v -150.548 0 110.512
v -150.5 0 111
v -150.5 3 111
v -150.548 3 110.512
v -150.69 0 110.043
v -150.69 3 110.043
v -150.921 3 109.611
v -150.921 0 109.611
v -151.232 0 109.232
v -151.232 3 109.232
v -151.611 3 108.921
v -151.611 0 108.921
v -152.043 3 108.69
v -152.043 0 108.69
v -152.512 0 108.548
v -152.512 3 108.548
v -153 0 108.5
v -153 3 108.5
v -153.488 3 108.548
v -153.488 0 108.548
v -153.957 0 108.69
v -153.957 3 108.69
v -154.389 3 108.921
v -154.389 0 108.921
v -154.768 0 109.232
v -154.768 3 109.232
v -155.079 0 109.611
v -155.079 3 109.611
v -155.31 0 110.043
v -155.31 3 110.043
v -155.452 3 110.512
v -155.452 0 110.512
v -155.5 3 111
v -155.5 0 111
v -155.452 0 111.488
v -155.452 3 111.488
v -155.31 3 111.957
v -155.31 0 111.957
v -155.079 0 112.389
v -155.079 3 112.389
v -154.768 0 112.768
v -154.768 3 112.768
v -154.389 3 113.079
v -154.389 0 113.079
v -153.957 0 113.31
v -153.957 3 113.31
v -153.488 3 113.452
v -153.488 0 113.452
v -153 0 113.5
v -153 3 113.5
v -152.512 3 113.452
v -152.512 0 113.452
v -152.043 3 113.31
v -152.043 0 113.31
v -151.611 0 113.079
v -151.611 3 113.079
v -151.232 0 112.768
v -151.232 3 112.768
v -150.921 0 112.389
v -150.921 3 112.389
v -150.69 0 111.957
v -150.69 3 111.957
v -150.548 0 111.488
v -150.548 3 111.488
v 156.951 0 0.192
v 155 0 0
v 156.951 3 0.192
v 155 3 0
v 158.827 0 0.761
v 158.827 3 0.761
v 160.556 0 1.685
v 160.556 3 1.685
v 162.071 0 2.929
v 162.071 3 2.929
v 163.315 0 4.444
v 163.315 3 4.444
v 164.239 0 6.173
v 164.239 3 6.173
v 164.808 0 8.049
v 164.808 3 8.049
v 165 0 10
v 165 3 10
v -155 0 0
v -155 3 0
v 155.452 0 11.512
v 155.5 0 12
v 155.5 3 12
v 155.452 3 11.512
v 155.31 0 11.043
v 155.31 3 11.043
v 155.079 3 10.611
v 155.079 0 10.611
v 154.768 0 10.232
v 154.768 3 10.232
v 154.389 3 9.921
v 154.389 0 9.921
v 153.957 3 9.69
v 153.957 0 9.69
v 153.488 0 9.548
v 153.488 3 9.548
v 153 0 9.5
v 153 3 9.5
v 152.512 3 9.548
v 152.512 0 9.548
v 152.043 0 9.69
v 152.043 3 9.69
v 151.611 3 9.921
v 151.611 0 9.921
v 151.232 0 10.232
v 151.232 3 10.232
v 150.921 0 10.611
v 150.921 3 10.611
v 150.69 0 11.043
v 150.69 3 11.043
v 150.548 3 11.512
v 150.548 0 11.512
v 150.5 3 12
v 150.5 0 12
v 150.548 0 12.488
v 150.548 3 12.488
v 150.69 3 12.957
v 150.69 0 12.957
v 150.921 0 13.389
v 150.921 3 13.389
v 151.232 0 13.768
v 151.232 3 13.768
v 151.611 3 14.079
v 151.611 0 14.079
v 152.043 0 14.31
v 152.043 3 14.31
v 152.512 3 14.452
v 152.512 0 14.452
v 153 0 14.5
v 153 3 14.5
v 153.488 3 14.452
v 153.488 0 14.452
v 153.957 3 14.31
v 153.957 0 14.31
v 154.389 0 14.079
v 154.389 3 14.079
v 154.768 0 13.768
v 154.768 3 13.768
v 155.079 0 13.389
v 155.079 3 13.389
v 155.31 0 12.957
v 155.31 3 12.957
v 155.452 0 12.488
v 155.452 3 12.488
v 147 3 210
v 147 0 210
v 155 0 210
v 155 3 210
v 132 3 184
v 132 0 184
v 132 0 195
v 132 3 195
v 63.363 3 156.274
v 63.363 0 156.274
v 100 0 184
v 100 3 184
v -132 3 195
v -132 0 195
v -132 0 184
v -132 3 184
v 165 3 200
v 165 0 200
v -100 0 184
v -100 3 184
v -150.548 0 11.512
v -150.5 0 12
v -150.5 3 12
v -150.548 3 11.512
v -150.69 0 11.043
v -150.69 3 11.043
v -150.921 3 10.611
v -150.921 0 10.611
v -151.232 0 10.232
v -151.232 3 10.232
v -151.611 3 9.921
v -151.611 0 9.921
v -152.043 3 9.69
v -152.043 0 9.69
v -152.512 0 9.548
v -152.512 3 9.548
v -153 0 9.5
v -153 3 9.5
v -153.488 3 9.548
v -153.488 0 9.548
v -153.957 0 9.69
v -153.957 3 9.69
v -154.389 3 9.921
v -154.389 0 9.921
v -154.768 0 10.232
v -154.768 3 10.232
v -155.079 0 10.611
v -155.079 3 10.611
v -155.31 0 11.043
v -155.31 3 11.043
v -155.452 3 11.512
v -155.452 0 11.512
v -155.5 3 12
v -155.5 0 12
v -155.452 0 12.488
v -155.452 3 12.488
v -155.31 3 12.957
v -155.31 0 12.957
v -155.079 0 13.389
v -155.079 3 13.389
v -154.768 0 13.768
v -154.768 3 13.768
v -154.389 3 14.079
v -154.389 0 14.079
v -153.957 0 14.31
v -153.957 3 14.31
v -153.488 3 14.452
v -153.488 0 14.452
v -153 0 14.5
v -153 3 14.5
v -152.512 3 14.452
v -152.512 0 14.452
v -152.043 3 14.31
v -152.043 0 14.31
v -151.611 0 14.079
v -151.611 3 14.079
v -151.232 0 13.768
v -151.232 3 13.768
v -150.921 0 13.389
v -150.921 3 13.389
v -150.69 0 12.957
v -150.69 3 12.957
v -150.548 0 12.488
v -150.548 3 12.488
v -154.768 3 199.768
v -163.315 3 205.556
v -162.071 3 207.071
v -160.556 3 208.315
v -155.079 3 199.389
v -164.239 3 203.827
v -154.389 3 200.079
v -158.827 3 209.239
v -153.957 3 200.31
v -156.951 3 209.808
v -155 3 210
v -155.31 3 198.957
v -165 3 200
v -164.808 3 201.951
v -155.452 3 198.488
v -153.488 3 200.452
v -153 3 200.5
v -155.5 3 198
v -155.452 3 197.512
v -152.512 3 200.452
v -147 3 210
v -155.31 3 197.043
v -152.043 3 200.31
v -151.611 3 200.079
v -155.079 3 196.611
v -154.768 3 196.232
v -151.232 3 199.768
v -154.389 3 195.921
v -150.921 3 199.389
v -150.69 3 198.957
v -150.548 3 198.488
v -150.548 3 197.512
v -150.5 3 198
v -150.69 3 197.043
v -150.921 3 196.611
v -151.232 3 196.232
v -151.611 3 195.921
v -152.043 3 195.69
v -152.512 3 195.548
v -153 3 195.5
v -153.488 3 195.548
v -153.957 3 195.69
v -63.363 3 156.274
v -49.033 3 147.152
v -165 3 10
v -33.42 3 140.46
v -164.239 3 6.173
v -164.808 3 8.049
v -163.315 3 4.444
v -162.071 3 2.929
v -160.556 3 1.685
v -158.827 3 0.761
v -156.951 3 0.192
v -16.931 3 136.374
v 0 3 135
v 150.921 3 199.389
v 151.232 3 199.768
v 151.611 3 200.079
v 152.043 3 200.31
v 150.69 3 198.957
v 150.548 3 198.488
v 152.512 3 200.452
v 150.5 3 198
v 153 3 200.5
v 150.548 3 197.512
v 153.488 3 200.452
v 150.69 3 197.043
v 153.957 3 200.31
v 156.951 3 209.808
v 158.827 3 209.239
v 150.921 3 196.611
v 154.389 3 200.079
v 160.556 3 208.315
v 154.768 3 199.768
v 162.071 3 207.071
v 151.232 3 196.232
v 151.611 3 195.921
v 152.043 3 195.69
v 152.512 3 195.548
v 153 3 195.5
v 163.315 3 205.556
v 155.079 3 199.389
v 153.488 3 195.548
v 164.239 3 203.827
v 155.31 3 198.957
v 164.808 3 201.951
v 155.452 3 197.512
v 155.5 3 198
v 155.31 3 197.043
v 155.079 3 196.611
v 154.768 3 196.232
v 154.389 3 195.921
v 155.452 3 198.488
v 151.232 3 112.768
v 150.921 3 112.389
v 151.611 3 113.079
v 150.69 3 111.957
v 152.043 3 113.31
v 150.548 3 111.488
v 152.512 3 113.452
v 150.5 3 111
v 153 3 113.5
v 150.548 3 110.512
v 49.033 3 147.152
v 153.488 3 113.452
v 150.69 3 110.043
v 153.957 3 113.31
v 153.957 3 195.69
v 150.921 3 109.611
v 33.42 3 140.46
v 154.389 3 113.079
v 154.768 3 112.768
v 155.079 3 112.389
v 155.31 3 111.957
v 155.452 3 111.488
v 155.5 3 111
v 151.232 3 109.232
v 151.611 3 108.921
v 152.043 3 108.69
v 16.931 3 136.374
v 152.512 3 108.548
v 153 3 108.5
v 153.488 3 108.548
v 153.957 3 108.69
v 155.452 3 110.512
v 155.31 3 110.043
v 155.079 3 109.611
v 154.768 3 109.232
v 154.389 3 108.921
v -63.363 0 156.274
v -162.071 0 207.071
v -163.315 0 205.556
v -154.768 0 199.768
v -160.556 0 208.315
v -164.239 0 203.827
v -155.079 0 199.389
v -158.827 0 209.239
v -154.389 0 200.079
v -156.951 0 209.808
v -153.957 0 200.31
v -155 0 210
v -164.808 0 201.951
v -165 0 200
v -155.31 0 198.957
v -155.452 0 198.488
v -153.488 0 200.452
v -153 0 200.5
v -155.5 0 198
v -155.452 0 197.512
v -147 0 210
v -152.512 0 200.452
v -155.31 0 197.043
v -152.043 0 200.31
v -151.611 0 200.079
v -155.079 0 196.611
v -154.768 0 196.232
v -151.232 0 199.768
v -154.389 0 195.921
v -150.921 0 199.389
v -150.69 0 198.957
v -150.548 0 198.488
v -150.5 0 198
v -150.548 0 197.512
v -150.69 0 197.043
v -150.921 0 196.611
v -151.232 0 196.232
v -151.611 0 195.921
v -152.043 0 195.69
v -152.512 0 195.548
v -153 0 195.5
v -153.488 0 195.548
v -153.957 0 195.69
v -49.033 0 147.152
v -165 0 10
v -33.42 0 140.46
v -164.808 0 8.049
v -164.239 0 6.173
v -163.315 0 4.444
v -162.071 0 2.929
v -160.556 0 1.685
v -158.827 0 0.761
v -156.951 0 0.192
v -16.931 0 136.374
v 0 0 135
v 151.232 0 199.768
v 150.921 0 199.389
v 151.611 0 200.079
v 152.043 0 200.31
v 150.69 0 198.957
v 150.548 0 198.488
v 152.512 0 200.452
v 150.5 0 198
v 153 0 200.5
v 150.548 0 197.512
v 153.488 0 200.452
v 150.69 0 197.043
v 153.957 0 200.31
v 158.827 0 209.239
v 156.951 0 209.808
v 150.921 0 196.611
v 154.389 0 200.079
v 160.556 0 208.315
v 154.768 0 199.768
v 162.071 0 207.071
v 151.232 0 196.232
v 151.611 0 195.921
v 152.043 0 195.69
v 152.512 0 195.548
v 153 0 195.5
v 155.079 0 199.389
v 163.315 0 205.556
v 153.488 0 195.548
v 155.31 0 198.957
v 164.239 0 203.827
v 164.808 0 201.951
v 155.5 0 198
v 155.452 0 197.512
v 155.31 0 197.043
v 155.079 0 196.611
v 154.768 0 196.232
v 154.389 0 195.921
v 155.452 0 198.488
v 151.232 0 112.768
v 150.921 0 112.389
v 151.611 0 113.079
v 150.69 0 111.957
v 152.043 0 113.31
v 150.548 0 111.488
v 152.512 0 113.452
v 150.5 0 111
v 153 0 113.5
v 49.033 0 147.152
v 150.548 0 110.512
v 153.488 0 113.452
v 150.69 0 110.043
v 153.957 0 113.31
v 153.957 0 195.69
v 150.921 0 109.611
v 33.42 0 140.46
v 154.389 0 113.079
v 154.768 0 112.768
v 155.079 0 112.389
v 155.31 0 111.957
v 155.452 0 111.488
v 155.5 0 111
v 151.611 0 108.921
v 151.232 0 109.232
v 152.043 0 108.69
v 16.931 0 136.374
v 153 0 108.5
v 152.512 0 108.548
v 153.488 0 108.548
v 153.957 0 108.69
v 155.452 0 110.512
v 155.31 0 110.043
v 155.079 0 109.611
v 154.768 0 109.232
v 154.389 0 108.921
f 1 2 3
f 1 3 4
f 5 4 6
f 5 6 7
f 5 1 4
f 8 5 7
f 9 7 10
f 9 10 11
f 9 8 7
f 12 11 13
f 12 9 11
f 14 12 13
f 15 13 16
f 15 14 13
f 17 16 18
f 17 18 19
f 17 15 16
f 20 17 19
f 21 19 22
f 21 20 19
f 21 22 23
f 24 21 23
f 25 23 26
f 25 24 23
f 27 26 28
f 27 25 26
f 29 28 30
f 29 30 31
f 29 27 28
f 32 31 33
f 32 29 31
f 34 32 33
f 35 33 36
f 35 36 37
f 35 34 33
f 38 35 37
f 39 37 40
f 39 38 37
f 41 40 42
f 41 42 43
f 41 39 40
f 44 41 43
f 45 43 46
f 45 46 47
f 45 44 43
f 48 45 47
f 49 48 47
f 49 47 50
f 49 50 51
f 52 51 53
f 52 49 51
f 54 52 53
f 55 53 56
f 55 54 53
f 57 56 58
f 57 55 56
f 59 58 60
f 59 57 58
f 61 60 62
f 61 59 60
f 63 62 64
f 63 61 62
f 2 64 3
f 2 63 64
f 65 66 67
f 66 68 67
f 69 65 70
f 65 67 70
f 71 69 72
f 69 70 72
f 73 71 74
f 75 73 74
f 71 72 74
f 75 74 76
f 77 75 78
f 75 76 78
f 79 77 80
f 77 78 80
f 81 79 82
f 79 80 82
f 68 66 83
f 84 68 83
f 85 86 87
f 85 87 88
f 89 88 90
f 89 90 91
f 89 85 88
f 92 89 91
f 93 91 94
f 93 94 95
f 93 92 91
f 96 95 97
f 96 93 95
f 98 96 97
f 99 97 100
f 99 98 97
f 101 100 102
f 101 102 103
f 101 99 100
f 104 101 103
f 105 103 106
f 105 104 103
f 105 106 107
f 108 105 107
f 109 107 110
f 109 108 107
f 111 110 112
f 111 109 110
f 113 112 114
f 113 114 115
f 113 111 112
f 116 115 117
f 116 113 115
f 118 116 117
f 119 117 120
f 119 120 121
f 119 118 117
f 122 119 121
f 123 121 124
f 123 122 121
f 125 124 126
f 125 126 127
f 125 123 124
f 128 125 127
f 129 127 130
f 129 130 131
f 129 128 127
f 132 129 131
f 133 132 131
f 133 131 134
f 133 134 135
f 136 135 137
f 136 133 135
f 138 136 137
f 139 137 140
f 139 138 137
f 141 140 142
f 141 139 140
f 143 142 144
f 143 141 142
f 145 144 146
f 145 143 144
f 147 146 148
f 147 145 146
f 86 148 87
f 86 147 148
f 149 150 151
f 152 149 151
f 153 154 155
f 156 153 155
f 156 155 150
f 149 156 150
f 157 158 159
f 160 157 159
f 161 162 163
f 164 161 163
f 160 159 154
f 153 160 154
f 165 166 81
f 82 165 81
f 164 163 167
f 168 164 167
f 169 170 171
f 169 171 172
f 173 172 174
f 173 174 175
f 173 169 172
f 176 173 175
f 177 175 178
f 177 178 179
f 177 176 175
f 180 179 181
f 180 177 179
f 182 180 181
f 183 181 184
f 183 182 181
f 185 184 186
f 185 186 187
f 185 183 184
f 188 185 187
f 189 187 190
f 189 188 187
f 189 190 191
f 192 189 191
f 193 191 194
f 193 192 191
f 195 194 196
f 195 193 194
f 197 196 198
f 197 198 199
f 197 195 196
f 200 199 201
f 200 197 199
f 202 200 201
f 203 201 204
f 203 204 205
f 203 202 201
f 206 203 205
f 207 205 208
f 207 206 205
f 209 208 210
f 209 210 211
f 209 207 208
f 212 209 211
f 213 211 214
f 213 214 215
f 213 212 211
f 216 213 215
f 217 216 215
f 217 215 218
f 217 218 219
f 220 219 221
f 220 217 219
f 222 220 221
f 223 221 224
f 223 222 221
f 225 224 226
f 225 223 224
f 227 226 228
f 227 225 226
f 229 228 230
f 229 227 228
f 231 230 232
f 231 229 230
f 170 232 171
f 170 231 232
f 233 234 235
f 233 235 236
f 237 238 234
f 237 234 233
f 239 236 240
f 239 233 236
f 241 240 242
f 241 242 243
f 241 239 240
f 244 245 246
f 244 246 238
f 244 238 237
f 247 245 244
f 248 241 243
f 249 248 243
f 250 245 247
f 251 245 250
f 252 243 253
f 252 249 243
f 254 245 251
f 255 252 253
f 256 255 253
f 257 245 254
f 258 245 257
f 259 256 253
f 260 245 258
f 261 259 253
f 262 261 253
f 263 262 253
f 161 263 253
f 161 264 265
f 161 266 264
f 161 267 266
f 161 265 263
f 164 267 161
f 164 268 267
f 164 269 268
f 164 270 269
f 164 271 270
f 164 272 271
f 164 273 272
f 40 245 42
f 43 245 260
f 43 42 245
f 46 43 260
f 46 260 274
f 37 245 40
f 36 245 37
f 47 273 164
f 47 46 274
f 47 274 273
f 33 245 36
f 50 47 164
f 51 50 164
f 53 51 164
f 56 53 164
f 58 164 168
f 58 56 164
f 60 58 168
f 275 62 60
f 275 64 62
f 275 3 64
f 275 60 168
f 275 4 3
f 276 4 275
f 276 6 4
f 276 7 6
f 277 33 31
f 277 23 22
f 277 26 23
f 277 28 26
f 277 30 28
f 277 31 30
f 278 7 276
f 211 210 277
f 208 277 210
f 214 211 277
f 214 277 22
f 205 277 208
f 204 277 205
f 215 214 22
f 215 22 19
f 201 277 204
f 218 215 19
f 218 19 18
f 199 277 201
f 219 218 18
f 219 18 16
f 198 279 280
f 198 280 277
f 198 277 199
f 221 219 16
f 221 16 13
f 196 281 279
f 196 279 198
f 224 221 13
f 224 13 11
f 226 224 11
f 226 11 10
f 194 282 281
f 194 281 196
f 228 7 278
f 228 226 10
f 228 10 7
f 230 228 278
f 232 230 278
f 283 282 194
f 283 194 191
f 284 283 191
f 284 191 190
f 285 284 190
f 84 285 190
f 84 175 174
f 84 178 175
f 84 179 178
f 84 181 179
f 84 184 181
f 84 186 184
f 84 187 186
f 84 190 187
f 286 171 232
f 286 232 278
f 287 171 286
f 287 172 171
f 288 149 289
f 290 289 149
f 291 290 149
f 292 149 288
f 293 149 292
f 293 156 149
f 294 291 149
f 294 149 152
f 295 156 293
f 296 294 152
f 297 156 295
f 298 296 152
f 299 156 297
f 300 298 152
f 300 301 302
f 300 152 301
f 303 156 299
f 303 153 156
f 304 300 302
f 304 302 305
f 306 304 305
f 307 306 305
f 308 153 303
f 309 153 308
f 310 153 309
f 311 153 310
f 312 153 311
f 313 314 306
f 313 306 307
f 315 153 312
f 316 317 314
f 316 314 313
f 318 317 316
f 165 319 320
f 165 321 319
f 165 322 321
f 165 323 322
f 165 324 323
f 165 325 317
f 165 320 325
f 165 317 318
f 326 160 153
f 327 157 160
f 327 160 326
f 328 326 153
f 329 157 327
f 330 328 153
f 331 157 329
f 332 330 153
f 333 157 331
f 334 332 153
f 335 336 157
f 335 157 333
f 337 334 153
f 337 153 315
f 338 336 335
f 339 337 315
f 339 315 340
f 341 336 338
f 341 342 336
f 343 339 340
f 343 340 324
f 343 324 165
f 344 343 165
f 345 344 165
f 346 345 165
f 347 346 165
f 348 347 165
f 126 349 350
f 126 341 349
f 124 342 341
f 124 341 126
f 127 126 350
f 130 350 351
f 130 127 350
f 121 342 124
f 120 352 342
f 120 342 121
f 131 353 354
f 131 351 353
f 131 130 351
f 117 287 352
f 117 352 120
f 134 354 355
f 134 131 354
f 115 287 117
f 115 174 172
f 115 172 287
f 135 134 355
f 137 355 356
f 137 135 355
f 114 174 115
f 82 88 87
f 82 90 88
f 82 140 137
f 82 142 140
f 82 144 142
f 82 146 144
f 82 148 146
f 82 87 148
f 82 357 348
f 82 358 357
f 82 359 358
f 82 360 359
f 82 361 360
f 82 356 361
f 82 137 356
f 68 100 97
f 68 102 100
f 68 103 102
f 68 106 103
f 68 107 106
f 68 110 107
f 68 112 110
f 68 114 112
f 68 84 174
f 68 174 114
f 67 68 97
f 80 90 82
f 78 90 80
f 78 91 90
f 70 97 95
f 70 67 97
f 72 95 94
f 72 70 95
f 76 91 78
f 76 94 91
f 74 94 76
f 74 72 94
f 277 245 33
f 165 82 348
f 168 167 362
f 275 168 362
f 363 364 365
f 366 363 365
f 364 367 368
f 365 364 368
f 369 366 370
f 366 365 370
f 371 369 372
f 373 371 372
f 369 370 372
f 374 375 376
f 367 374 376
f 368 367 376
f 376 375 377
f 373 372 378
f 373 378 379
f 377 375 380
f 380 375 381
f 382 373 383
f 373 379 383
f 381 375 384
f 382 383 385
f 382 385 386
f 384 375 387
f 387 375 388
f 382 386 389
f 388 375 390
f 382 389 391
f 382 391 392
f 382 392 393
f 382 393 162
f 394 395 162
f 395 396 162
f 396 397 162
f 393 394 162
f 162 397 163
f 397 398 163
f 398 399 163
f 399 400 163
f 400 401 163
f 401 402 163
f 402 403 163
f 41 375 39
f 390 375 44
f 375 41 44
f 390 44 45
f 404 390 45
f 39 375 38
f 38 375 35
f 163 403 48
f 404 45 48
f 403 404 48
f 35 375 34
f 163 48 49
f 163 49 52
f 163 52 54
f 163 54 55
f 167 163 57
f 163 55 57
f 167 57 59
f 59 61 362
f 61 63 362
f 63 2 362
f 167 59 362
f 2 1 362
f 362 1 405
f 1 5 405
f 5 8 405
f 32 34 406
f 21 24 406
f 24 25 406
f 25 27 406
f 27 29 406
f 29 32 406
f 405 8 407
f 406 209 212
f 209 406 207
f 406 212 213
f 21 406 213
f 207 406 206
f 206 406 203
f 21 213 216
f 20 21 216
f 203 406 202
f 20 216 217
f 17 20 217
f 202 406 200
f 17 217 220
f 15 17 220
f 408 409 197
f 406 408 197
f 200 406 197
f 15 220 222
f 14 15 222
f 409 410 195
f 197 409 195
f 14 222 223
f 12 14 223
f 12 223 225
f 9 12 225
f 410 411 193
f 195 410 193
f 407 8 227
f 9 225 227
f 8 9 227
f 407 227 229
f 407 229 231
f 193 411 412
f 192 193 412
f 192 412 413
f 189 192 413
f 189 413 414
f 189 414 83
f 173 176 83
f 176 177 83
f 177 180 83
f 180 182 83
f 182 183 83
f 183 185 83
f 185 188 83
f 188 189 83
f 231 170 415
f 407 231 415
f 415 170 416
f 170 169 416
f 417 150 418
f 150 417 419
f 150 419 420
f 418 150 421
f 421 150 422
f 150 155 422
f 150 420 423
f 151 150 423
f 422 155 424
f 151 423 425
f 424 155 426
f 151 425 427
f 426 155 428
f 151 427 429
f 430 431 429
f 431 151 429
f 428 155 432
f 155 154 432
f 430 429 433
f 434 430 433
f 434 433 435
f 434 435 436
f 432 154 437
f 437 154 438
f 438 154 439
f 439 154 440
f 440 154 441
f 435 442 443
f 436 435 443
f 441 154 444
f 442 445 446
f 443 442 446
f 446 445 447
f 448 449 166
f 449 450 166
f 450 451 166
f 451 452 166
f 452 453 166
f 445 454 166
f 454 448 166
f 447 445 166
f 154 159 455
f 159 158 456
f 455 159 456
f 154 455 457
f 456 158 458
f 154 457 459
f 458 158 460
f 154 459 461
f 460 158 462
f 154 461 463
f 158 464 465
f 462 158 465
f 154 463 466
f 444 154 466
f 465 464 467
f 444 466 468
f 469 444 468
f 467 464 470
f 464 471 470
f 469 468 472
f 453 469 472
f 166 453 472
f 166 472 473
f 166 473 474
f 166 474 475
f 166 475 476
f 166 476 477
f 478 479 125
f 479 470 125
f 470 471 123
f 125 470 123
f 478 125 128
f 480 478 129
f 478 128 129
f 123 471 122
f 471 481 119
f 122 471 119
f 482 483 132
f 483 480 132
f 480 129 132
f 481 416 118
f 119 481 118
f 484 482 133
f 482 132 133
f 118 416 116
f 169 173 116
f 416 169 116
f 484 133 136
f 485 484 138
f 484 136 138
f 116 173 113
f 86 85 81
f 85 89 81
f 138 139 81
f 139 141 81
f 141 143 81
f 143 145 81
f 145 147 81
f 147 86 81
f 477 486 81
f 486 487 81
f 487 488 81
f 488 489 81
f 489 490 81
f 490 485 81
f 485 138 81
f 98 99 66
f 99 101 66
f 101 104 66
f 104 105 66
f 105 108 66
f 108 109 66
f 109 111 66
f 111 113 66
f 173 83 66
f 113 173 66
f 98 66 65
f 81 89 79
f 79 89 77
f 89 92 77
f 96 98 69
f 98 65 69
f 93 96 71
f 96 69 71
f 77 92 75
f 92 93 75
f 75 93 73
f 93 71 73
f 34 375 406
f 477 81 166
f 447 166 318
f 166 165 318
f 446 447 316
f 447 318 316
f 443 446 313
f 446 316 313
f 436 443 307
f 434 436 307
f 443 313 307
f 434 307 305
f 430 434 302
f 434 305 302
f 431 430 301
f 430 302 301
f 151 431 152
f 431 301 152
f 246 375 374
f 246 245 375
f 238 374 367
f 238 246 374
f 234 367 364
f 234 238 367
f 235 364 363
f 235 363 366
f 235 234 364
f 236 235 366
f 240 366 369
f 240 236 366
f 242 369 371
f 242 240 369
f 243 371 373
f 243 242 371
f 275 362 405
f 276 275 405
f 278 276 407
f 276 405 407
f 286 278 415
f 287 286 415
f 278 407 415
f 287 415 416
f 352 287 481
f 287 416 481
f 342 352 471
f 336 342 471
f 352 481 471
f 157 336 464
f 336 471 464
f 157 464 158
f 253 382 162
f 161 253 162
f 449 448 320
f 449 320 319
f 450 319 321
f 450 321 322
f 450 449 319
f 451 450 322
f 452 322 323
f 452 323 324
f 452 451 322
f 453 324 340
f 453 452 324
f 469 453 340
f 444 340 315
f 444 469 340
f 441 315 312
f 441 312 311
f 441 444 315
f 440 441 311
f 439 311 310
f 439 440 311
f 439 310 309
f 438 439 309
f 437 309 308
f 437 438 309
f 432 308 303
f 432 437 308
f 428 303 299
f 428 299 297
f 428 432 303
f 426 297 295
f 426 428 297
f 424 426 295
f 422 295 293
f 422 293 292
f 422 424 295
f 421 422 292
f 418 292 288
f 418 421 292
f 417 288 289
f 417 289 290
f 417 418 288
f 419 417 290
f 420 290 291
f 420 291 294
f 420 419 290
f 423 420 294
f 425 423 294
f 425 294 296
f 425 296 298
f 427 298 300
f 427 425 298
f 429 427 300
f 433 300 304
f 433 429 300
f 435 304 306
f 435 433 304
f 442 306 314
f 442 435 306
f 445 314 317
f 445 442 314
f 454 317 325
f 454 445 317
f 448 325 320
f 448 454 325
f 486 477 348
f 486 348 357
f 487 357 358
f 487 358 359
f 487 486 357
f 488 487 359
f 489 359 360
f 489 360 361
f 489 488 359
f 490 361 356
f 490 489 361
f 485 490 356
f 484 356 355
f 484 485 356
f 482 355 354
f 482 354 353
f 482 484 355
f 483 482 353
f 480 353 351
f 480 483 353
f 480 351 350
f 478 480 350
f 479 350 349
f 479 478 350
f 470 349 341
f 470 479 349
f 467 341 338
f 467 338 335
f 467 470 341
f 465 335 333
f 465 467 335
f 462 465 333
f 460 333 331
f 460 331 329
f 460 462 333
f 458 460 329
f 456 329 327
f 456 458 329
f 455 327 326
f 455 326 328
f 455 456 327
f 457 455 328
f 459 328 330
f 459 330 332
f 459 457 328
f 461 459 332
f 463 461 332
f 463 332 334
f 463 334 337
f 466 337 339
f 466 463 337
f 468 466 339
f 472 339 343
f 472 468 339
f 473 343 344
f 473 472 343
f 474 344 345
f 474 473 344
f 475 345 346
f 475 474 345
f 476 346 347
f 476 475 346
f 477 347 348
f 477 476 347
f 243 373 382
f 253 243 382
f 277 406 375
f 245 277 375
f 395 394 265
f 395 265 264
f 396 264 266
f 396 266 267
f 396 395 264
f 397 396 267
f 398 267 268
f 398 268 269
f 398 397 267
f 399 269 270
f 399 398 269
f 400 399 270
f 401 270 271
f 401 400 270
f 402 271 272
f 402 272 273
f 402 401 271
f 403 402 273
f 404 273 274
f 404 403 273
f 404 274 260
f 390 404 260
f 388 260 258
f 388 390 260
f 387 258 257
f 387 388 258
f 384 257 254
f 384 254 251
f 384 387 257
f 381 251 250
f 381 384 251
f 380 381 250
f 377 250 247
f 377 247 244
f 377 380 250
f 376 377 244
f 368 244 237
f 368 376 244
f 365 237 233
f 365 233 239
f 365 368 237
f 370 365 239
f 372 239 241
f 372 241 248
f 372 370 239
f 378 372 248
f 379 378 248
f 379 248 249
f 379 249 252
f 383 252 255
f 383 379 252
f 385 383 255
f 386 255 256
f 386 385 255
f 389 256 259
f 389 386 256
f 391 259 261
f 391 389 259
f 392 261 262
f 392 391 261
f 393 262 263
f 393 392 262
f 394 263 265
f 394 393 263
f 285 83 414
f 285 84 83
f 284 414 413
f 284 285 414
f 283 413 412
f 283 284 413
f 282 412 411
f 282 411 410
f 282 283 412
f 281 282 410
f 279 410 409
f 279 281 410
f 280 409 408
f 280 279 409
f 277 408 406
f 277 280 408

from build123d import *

# Parameters (mm, degrees)
ESQUISSE1_R      = 2.5
EXTRUSION1_DEPTH = 3
CONG_1_R         = 10


with BuildPart() as part:
    # Esquisse1 → Extrusion1 (new body)
    with BuildSketch(Plane(origin=(0, 0, 0), x_dir=(1, 0, 0), z_dir=(0, 1, 0))):
        with BuildLine():
            Line((165, 0), (-165, 0))
            Line((-165, 0), (-165, -210))
            Line((-165, -210), (-147, -210))
            Line((-147, -210), (-132, -195))
            Line((-132, -195), (-132, -184))
            Line((-132, -184), (-100, -184))
            Line((-100, -184), (-63.363257782, -156.27367461))
            ThreePointArc((-63.363257782, -156.27367461), (0, -135), (63.363257782, -156.27367461))
            Line((63.363257782, -156.27367461), (100, -184))
            Line((100, -184), (132, -184))
            Line((132, -184), (132, -195))
            Line((132, -195), (147, -210))
            Line((147, -210), (165, -210))
            Line((165, -210), (165, 0))
        make_face()
        with Locations((-153, -12)):
            Circle(ESQUISSE1_R, mode=Mode.SUBTRACT)
        with Locations((153, -12)):
            Circle(ESQUISSE1_R, mode=Mode.SUBTRACT)
        with Locations((-153, -198)):
            Circle(ESQUISSE1_R, mode=Mode.SUBTRACT)
        with Locations((153, -198)):
            Circle(ESQUISSE1_R, mode=Mode.SUBTRACT)
        with Locations((-153, -111)):
            Circle(ESQUISSE1_R, mode=Mode.SUBTRACT)
        with Locations((153, -111)):
            Circle(ESQUISSE1_R, mode=Mode.SUBTRACT)
    extrude(amount=EXTRUSION1_DEPTH)

    # Congé1
    cong_1_edges = [part.edges().sort_by_distance(p)[0] for p in [
        (-165, 1.5, 0),
        (165, 1.5, 0),
        (165, 1.5, 210),
        (-165, 1.5, 210),
    ]]
    fillet(cong_1_edges, radius=CONG_1_R)


solid = part.part
